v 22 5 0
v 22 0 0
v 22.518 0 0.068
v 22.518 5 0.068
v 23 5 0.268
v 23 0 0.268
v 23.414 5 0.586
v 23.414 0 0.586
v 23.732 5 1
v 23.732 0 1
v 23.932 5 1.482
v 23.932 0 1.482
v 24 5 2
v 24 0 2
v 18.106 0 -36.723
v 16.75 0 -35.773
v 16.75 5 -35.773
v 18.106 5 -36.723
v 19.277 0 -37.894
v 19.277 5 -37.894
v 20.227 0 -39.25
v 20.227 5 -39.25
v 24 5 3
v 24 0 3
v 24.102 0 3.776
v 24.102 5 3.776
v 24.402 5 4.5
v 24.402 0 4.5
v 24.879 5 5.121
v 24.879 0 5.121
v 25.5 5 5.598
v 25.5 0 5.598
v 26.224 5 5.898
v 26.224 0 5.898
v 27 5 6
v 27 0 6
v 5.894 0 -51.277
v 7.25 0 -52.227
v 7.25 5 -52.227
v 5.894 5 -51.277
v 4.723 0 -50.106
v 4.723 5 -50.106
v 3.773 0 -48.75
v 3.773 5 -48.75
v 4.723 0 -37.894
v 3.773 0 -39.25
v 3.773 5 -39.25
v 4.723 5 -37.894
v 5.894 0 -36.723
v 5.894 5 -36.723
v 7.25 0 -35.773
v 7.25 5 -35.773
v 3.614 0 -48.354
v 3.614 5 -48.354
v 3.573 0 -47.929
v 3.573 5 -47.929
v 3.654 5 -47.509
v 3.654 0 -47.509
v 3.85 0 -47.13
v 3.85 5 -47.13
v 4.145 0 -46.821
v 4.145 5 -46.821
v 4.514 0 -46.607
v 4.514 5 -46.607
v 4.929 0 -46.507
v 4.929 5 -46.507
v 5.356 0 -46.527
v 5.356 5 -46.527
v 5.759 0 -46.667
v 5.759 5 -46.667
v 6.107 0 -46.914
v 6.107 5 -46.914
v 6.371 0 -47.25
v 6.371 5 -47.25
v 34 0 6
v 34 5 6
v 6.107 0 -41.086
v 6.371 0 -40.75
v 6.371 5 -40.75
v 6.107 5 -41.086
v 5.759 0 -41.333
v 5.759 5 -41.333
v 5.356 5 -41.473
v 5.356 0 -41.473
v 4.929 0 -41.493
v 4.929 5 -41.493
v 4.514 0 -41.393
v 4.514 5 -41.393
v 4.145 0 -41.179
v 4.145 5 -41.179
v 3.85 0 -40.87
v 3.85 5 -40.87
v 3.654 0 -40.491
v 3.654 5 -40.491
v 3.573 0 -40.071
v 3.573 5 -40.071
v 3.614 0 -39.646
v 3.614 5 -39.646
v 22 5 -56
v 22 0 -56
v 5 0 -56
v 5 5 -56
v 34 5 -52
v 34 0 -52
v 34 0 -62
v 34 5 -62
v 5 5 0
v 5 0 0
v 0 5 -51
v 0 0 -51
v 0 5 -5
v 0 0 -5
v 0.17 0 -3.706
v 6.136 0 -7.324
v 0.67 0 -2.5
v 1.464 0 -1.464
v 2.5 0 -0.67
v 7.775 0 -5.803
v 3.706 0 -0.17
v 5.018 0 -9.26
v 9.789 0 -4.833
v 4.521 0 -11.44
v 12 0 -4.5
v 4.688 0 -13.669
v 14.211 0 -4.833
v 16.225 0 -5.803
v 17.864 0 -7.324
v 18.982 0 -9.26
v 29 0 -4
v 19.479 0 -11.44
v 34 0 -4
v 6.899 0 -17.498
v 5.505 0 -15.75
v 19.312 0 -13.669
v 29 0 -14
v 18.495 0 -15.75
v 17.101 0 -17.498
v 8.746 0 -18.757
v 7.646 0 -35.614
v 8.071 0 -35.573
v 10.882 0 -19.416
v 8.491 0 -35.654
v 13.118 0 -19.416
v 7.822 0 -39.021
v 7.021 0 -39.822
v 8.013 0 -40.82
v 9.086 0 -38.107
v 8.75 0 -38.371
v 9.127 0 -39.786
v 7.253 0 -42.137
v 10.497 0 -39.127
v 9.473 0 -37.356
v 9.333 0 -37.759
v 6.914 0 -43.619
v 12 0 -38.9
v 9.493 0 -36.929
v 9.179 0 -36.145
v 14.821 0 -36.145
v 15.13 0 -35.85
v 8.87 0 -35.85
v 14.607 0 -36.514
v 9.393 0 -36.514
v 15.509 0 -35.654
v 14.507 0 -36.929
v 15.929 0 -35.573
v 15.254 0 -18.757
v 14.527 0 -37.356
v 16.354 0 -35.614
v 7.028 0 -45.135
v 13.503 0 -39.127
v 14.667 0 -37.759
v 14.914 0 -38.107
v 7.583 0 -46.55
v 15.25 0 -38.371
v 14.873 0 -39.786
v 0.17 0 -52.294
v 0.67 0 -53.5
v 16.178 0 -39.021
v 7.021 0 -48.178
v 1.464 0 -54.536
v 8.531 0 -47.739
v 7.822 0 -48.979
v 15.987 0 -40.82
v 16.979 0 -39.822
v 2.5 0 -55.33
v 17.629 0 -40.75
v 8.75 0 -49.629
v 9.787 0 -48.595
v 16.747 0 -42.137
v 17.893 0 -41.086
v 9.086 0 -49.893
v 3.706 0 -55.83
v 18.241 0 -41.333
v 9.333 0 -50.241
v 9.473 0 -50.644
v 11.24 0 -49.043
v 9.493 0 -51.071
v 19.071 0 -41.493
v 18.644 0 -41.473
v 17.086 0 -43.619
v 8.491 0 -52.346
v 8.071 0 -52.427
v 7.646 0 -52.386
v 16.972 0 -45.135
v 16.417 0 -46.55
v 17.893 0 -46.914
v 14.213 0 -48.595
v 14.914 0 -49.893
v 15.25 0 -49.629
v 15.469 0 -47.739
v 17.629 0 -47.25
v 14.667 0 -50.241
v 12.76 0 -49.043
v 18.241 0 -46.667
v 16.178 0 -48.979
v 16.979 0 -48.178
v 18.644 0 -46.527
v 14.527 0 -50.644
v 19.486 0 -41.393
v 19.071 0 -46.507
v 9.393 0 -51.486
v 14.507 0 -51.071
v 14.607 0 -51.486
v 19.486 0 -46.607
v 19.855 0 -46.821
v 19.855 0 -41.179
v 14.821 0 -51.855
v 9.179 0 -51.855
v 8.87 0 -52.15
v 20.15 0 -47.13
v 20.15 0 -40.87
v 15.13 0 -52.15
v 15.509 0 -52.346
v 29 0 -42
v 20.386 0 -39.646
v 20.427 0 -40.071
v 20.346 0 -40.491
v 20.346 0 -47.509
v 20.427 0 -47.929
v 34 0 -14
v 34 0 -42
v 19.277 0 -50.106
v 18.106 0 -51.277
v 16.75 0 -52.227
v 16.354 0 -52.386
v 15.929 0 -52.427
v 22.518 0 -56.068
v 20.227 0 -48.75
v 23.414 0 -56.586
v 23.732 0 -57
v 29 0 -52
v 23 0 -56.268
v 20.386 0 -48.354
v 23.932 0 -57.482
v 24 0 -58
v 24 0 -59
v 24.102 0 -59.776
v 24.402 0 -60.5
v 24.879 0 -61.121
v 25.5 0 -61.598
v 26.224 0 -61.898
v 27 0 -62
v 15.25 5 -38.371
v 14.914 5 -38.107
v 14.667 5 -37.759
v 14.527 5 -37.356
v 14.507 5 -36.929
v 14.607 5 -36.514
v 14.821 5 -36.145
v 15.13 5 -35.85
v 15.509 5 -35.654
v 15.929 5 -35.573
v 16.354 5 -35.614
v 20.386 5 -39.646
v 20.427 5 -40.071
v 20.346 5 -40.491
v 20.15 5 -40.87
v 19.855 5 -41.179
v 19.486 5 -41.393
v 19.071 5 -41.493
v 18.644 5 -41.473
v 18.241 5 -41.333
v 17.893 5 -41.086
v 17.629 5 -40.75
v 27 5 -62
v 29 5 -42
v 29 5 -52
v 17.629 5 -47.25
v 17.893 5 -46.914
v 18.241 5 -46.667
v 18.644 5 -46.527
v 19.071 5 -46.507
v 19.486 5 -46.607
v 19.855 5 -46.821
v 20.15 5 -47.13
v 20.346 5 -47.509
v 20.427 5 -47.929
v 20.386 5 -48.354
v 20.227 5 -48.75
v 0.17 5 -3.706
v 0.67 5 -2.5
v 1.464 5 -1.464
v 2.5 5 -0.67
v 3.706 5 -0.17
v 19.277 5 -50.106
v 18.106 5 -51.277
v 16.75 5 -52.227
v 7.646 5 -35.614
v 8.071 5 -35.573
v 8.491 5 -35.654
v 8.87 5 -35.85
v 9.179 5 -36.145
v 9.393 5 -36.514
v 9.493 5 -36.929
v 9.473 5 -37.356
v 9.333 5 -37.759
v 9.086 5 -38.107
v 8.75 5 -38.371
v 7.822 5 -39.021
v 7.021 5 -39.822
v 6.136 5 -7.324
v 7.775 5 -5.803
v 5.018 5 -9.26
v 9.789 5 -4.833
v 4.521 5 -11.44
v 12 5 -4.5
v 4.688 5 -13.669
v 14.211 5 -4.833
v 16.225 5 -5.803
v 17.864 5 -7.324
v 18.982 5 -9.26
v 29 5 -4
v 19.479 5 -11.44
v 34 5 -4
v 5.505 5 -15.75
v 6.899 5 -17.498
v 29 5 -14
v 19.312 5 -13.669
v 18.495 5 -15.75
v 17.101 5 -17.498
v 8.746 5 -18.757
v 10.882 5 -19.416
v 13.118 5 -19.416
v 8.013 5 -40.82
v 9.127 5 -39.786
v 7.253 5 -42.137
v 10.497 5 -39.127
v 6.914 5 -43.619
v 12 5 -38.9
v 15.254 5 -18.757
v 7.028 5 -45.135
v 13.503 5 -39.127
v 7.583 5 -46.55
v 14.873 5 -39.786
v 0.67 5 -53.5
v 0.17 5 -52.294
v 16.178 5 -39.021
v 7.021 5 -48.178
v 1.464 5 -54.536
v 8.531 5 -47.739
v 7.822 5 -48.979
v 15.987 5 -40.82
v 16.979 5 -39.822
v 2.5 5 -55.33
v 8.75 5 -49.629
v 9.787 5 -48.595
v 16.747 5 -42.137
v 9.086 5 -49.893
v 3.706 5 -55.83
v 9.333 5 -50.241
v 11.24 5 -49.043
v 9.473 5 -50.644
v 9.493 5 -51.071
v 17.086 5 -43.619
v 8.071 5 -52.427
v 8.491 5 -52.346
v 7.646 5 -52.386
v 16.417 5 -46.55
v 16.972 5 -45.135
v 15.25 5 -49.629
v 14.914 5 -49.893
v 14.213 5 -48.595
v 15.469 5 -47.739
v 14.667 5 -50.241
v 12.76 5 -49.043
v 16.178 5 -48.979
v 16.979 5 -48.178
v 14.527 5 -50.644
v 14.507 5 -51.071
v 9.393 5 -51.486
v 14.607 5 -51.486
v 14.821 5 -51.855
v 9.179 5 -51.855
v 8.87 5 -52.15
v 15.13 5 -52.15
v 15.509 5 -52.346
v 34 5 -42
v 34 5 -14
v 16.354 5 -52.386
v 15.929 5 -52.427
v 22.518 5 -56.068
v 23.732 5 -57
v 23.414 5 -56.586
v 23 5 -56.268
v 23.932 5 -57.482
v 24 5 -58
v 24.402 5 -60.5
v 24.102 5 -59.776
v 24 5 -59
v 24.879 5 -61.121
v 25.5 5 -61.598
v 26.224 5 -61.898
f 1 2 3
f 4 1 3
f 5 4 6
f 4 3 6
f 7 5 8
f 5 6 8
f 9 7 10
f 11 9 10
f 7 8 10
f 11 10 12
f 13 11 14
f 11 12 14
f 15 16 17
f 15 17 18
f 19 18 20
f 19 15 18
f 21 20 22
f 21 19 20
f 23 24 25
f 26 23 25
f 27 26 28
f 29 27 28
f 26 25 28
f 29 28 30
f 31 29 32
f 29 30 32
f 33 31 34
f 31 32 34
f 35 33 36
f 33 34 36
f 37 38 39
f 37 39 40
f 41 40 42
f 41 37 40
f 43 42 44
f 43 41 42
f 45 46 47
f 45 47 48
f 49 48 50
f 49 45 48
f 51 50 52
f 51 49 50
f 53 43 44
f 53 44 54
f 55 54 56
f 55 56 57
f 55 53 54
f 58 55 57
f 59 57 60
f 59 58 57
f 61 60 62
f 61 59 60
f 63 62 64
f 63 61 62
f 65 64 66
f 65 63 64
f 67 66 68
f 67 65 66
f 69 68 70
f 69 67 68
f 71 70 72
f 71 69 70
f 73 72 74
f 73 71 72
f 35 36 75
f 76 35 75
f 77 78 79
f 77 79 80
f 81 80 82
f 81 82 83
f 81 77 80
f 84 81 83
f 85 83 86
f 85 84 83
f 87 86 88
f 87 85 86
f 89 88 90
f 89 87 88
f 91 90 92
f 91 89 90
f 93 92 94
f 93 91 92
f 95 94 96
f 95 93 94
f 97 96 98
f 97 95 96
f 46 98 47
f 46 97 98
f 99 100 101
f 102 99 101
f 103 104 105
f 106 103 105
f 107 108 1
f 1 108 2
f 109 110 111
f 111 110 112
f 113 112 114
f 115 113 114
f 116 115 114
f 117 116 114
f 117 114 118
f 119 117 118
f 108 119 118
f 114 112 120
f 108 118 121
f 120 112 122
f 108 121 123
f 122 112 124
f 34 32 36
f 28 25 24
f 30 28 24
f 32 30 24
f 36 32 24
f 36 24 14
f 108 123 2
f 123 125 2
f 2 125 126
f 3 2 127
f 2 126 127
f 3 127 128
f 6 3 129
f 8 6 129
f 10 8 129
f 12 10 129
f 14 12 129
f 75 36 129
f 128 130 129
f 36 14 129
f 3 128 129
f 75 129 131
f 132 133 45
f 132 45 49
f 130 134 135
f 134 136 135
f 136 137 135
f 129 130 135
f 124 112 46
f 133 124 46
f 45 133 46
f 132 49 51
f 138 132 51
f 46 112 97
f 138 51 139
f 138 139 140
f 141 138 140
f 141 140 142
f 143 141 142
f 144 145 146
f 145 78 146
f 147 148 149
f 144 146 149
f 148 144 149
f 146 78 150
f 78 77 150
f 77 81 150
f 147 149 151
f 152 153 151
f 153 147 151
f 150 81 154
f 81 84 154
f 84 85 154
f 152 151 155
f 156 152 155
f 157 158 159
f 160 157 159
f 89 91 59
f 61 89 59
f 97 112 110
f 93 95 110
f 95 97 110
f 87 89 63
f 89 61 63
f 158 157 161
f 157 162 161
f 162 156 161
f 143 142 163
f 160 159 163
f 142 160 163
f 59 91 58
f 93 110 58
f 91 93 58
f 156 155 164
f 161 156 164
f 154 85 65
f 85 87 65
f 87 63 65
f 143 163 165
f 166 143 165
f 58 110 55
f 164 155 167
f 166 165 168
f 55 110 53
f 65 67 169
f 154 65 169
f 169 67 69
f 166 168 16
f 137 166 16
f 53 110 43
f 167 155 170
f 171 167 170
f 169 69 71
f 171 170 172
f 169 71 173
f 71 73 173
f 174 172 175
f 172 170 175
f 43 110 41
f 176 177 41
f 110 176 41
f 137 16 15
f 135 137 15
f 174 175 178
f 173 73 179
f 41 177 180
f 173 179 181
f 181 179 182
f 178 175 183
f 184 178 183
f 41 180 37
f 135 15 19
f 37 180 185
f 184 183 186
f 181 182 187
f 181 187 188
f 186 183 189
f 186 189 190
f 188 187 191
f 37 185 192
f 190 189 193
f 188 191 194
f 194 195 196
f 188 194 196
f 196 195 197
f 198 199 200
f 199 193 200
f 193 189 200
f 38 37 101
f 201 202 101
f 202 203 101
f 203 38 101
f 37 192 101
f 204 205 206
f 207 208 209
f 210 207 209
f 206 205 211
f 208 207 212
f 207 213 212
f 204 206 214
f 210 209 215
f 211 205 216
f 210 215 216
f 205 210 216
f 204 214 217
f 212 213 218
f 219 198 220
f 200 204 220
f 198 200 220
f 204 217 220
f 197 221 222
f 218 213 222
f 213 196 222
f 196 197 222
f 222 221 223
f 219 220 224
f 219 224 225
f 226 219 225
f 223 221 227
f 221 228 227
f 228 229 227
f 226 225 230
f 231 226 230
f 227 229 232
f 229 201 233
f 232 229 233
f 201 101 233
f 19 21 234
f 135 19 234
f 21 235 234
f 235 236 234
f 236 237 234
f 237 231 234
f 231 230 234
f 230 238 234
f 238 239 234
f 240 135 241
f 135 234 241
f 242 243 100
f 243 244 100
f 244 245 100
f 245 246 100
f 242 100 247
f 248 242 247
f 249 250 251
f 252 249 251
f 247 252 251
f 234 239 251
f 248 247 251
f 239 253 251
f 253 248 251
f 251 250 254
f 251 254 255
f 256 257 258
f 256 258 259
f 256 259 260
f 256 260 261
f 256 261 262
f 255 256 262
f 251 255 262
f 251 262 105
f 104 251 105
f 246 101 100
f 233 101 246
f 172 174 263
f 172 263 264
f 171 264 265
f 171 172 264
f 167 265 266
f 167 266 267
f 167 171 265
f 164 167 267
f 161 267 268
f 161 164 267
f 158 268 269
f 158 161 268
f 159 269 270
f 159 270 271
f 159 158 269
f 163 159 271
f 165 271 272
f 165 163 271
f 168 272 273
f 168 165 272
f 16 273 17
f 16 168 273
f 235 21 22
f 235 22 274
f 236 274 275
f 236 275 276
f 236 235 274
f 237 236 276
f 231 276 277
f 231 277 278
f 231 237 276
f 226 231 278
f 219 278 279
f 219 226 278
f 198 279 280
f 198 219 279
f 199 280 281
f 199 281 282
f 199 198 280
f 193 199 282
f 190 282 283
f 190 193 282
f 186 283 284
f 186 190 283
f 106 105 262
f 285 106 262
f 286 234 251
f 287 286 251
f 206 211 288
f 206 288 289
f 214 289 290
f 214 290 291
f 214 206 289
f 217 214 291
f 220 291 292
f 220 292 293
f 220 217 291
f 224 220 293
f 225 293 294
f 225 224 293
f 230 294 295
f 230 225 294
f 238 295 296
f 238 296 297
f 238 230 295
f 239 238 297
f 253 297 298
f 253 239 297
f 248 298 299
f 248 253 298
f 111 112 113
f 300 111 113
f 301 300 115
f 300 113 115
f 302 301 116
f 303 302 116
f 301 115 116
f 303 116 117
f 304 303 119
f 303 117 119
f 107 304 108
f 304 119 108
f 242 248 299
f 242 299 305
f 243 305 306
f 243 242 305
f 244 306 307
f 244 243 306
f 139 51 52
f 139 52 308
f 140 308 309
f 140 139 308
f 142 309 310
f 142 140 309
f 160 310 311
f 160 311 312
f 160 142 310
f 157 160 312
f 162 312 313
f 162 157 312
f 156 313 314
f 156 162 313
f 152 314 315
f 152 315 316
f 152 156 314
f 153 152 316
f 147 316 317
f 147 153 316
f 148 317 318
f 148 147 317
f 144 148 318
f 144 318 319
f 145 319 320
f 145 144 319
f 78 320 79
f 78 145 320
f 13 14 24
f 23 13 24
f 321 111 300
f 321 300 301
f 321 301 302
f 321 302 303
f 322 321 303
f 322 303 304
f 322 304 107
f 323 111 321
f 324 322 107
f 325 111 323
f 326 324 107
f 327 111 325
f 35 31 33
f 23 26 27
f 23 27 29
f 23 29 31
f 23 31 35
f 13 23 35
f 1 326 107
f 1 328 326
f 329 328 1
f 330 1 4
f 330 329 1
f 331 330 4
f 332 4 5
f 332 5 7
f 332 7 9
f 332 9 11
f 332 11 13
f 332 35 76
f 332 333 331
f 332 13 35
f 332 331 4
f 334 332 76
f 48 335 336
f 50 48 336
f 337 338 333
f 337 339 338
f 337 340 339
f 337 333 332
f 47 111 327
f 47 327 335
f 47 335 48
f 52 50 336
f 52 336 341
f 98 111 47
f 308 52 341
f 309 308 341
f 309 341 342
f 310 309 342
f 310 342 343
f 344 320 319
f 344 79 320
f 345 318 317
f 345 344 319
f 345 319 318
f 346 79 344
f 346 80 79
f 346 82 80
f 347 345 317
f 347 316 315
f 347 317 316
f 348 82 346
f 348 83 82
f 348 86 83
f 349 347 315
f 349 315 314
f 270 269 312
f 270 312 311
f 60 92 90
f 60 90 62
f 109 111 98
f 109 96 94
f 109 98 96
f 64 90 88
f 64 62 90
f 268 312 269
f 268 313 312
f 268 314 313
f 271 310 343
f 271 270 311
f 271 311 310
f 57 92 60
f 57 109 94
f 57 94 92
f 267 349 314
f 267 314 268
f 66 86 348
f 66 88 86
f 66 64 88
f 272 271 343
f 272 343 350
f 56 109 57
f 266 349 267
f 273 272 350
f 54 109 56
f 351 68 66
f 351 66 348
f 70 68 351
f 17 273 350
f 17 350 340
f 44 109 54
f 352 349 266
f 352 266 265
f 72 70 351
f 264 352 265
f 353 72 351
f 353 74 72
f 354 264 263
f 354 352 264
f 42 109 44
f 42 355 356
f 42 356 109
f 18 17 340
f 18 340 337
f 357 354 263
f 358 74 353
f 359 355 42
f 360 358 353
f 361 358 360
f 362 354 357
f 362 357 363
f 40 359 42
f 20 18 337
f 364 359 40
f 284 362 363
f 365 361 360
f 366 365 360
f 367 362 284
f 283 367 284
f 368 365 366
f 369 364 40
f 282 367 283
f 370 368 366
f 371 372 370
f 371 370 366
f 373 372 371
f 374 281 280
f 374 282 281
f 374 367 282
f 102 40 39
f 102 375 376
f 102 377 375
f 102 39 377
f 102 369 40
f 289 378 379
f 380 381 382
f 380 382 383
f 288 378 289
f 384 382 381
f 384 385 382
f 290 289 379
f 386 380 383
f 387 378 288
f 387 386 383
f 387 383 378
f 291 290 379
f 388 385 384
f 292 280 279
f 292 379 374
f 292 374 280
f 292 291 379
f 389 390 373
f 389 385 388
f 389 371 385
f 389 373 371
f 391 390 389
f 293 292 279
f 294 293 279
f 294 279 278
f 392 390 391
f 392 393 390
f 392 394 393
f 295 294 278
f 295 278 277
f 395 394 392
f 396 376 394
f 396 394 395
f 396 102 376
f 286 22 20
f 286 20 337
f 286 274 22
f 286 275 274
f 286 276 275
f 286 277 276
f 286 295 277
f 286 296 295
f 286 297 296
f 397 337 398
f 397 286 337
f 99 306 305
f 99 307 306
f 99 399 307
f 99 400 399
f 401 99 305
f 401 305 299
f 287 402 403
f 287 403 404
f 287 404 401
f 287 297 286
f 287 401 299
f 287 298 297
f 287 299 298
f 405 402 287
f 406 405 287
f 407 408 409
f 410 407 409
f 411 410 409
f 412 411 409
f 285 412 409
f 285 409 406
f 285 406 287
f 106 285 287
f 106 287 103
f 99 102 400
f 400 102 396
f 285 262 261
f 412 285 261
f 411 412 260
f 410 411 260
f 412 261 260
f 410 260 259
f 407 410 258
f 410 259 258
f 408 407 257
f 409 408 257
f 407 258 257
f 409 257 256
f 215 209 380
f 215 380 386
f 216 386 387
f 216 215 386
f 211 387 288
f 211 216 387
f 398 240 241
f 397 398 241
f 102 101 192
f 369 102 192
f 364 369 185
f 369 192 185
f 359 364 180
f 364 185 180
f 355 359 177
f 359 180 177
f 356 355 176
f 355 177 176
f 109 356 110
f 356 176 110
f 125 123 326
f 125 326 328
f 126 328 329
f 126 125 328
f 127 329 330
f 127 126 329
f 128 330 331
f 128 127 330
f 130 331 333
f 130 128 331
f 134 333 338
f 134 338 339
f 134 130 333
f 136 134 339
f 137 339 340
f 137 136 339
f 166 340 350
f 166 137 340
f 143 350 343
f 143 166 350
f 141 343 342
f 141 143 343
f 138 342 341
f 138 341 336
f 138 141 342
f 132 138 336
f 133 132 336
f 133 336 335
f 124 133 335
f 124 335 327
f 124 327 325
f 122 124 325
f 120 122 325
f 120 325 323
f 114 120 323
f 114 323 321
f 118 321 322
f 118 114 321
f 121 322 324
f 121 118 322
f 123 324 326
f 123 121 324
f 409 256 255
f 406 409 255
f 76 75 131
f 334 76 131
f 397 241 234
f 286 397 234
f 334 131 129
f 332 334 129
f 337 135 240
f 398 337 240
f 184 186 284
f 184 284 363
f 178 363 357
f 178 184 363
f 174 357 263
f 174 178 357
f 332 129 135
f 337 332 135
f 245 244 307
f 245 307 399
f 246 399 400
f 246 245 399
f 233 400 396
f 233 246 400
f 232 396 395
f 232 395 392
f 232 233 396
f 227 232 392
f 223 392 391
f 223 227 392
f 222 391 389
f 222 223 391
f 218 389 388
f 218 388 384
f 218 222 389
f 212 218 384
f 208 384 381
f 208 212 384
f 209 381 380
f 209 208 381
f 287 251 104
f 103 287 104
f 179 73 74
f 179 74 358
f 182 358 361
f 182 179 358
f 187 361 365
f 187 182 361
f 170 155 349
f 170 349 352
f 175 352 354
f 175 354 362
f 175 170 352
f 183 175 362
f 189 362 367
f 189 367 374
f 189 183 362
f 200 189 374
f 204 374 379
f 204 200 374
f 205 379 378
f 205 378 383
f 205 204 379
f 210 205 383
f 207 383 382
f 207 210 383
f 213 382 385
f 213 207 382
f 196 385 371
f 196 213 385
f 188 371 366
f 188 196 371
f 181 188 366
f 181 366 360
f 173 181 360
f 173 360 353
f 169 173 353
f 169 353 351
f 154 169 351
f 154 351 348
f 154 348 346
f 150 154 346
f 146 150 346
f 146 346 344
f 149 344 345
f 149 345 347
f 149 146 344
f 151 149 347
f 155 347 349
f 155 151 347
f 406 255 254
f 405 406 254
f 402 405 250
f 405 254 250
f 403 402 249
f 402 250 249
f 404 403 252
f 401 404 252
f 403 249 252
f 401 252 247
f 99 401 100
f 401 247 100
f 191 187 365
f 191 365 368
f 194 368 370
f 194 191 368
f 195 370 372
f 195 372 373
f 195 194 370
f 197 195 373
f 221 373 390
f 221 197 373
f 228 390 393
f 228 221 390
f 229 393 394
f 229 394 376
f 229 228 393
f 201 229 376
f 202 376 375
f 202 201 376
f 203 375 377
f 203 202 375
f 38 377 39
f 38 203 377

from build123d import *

# Parameters (mm, degrees)
SKETCH_1_R      = 5.1
SKETCH_1_R_2    = 7.5
EXTRUDE_1_DEPTH = 5


with BuildPart() as part:
    # 草图1 → 凸台-拉伸1 (new body)
    with BuildSketch(Plane(origin=(0, 0, 0), x_dir=(1, 0, 0), z_dir=(0, 1, 0))):
        with BuildLine():
            Line((5, 0), (22, 0))
            ThreePointArc((22, 0), (23.414213562, -0.585786438), (24, -2))
            Line((24, -2), (24, -3))
            ThreePointArc((24, -3), (24.878679656, -5.121320344), (27, -6))
            Line((27, -6), (34, -6))
            Line((34, -6), (34, 4))
            Line((34, 4), (29, 4))
            Line((29, 4), (29, 14))
            Line((29, 14), (34, 14))
            Line((34, 14), (34, 42))
            Line((34, 42), (29, 42))
            Line((29, 42), (29, 52))
            Line((29, 52), (34, 52))
            Line((34, 52), (34, 62))
            Line((34, 62), (27, 62))
            ThreePointArc((27, 62), (24.878679656, 61.121320344), (24, 59))
            Line((24, 59), (24, 58))
            ThreePointArc((24, 58), (23.414213562, 56.585786438), (22, 56))
            Line((22, 56), (5, 56))
            ThreePointArc((5, 56), (1.464466094, 54.535533906), (0, 51))
            Line((0, 51), (0, 5))
            ThreePointArc((0, 5), (1.464466094, 1.464466094), (5, 0))
        make_face()
        with Locations(Location((12, 44, 0), (0, 0, 270))):
            Circle(SKETCH_1_R, mode=Mode.SUBTRACT)
        with Locations(Location((12, 12, 0), (0, 0, 270))):
            Circle(SKETCH_1_R_2, mode=Mode.SUBTRACT)
        with BuildLine():
            ThreePointArc((7.25, 52.227241336), (5.282485579, 50.717514421), (3.772758664, 48.75))
            ThreePointArc((3.772758664, 48.75), (4.32179677, 46.700961894), (6.370834875, 47.25))
            ThreePointArc((6.370834875, 47.25), (7.403805922, 48.596194078), (8.75, 49.629165125))
            ThreePointArc((8.75, 49.629165125), (9.299038106, 51.67820323), (7.25, 52.227241336))
        make_face(mode=Mode.SUBTRACT)
        with BuildLine():
            ThreePointArc((20.227241336, 48.75), (18.717514421, 50.717514421), (16.75, 52.227241336))
            ThreePointArc((16.75, 52.227241336), (14.700961894, 51.67820323), (15.25, 49.629165125))
            ThreePointArc((15.25, 49.629165125), (16.596194078, 48.596194078), (17.629165125, 47.25))
            ThreePointArc((17.629165125, 47.25), (19.67820323, 46.700961894), (20.227241336, 48.75))
        make_face(mode=Mode.SUBTRACT)
        with BuildLine():
            ThreePointArc((16.75, 35.772758664), (18.717514421, 37.282485579), (20.227241336, 39.25))
            ThreePointArc((20.227241336, 39.25), (19.67820323, 41.299038106), (17.629165125, 40.75))
            ThreePointArc((17.629165125, 40.75), (16.596194078, 39.403805922), (15.25, 38.370834875))
            ThreePointArc((15.25, 38.370834875), (14.700961894, 36.32179677), (16.75, 35.772758664))
        make_face(mode=Mode.SUBTRACT)
        with BuildLine():
            ThreePointArc((3.772758664, 39.25), (5.282485579, 37.282485579), (7.25, 35.772758664))
            ThreePointArc((7.25, 35.772758664), (9.299038106, 36.32179677), (8.75, 38.370834875))
            ThreePointArc((8.75, 38.370834875), (7.403805922, 39.403805922), (6.370834875, 40.75))
            ThreePointArc((6.370834875, 40.75), (4.32179677, 41.299038106), (3.772758664, 39.25))
        make_face(mode=Mode.SUBTRACT)
    extrude(amount=EXTRUDE_1_DEPTH)


solid = part.part
